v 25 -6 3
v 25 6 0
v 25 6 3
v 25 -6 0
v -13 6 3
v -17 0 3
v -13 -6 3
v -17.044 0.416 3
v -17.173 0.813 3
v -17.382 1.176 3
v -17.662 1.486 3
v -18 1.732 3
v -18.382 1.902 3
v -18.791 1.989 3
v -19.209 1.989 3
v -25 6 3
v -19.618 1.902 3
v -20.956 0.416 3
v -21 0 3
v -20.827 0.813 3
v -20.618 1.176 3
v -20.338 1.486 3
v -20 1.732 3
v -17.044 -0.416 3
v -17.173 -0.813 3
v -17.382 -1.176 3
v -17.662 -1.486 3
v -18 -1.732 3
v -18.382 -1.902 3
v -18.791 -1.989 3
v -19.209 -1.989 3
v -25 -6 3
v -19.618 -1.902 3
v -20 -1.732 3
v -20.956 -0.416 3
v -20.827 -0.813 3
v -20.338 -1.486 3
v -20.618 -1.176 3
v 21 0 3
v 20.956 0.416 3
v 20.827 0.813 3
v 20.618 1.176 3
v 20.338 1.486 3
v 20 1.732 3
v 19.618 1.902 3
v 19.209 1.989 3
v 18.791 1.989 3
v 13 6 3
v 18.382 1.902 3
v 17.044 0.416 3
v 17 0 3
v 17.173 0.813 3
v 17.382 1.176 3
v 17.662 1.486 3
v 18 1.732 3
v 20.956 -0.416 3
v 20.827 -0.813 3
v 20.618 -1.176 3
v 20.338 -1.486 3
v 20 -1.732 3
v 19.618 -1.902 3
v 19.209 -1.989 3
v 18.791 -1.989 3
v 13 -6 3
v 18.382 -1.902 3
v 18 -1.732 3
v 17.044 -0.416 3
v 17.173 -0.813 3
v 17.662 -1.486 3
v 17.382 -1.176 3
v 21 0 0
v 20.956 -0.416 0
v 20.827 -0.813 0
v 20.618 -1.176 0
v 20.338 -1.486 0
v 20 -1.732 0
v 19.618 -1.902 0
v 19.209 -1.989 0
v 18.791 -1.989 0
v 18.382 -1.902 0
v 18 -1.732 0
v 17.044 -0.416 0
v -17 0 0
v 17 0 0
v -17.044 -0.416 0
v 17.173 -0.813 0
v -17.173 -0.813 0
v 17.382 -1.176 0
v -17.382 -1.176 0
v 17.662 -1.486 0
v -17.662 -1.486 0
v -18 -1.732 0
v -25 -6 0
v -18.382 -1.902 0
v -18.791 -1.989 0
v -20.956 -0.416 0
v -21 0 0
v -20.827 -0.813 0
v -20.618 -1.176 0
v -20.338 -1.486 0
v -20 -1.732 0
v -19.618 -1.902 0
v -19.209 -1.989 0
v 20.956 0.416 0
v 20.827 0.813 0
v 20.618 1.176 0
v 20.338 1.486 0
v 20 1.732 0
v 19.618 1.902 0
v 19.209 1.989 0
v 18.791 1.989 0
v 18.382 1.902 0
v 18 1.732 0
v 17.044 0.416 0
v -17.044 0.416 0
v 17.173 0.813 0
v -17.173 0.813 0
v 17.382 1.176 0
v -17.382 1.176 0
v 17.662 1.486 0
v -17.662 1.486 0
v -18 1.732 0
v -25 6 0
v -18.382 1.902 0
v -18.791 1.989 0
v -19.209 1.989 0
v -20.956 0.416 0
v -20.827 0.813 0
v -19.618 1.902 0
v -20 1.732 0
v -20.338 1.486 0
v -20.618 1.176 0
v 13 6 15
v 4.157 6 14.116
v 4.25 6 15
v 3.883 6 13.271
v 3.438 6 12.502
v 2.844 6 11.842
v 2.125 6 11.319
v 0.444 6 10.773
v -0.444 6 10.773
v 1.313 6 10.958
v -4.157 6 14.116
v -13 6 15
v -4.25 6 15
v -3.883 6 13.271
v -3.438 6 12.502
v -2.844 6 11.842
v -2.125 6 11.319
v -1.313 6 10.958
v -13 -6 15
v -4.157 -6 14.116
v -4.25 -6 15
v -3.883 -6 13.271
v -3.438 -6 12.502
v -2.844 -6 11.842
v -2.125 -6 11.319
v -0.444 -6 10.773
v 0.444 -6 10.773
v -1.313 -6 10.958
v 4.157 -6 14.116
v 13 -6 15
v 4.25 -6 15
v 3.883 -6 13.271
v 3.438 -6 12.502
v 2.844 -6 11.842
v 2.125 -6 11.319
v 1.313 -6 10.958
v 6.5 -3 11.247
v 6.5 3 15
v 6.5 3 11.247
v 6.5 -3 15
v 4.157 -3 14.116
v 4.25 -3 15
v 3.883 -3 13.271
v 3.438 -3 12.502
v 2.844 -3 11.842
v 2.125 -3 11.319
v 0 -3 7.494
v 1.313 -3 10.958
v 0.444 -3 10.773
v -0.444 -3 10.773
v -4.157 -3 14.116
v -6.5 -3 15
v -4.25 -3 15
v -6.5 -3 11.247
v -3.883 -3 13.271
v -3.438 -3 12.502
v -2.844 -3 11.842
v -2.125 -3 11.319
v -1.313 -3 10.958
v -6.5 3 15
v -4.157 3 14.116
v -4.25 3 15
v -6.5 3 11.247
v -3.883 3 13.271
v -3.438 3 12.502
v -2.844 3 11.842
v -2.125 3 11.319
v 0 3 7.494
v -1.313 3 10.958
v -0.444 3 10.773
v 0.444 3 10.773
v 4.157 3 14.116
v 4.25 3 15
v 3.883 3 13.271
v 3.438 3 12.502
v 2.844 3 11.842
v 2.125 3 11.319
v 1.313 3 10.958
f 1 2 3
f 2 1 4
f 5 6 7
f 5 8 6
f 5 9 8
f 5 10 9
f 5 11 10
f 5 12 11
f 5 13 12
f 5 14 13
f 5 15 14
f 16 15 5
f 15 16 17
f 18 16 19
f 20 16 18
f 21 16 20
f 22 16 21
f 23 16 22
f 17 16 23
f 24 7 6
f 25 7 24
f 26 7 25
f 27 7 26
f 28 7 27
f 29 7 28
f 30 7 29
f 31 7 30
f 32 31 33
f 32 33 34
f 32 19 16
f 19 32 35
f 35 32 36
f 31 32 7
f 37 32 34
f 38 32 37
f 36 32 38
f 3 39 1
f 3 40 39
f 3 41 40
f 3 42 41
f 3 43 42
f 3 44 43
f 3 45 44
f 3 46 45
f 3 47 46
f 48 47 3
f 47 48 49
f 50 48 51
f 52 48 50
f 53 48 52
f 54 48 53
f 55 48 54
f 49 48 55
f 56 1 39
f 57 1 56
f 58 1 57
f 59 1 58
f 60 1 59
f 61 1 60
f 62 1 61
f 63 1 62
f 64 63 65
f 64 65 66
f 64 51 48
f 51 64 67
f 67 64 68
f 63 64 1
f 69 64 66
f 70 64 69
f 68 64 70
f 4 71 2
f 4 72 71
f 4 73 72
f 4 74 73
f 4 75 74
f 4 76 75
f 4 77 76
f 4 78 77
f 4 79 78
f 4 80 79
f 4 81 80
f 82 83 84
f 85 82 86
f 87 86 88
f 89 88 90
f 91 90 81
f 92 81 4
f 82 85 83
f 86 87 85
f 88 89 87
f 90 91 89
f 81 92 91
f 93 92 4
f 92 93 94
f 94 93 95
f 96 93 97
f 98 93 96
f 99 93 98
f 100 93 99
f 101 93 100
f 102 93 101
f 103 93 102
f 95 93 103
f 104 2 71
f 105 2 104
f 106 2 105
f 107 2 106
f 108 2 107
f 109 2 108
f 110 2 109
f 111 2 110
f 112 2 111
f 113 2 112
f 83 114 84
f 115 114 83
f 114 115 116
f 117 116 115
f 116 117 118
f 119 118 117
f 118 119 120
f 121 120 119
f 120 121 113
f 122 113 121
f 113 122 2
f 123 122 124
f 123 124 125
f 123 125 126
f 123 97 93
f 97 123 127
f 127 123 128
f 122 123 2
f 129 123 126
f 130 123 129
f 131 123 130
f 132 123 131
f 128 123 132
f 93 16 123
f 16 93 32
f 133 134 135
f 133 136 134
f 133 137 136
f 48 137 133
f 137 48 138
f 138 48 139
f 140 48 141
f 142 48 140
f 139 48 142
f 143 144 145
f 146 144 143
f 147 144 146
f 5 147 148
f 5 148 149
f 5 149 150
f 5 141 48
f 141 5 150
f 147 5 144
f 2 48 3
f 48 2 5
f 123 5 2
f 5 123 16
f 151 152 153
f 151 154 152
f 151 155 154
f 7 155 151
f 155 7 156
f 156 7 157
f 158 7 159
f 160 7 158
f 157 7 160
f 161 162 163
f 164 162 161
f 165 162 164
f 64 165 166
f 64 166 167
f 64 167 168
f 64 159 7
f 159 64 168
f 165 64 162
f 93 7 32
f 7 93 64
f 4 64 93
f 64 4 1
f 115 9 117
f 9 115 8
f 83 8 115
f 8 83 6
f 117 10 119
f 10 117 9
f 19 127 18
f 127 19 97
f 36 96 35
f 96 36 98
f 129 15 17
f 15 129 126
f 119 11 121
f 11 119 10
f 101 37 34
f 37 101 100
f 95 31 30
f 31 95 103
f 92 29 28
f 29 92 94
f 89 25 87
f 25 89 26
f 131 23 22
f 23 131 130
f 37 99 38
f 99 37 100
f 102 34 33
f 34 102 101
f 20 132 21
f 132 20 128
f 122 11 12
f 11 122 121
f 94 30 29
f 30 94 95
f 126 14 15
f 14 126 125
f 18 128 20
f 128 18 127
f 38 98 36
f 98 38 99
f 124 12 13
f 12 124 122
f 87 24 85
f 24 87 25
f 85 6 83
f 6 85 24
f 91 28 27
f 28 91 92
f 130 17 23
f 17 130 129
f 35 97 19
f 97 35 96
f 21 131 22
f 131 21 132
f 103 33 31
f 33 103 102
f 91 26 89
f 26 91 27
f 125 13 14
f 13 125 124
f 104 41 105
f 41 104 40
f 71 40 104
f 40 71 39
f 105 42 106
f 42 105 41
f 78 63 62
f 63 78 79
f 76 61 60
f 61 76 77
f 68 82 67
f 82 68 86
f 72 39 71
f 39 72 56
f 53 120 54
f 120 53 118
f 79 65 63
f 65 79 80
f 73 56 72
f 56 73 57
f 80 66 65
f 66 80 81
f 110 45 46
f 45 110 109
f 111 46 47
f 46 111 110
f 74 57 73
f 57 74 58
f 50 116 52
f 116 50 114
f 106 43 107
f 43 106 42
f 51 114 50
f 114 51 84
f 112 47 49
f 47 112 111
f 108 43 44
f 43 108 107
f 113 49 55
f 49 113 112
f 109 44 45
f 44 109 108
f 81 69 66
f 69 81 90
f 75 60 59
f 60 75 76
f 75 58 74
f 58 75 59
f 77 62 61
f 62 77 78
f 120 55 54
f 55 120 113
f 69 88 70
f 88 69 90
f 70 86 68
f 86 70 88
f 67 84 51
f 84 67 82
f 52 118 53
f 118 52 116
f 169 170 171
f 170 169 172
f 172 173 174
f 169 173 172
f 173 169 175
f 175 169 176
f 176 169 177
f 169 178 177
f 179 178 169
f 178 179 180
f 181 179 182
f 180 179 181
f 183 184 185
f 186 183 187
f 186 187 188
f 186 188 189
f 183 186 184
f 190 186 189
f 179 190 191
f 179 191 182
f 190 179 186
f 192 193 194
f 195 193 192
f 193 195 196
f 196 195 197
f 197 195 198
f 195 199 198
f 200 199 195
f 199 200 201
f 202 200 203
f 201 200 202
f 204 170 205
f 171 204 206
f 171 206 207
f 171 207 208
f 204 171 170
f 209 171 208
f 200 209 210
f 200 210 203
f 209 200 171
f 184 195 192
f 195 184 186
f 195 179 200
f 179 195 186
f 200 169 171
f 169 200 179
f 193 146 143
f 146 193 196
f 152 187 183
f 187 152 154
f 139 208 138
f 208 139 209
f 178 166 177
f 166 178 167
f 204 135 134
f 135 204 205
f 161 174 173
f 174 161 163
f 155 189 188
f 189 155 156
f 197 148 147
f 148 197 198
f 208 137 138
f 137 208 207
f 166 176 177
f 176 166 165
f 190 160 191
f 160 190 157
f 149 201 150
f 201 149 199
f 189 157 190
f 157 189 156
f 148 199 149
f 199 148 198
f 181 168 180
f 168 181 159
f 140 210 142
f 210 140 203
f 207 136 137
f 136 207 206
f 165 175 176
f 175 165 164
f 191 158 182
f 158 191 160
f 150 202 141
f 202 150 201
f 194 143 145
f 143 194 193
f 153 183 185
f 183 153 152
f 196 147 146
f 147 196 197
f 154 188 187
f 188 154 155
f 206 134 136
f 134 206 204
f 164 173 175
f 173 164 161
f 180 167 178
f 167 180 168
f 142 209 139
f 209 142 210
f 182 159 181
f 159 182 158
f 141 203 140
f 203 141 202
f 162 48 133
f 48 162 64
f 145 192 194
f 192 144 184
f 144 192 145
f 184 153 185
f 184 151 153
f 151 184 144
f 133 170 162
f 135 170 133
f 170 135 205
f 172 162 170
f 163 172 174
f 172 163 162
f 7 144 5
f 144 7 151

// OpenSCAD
// file: common.scad
/*--------------------------------------------------------------------------*
* Sizes and common routines for the CNC parts
*---------------------------------------------------------------------------*
* 13-Jul-2014 ShaneG
*
* First set of definitions using the components I have to experiment with.
*--------------------------------------------------------------------------*/

//---------------------------------------------------------------------------
// Common definitions
//---------------------------------------------------------------------------

RESOLUTION  = 0.1; // Resolution of your printer

PANEL_DEPTH = 3.0; // The prefered size of any shell material

BOLT_SIZE = 4.0; // Diameter of connecting bolts (M4)

BED_TO_MOUNT = 15.0;

GUIDE_ROD_DIAMETER = 12.00;

BEARING_DIAMETER = 22.00;
BEARING_HEIGHT   = 7.00;

//---------------------------------------------------------------------------
// Nuts
//---------------------------------------------------------------------------

/* Hex Nut
**
** Dimensios for a hex nut. The 'outer' diameter (ie: straight side to
** parallel straight side) of the nut does not seem very consistent -
** measurements indicate a 0.5mm range of error across nuts.
*/

NUT_OUTER_DIAMETER = 13.00;
NUT_INNER_DIAMETER = 8.50;  // Enough room for the bore and thread
NUT_HEIGHT         = 6;

/** Create a hexagon.
 *
 * The 'length' parameter specifies the distance from the center of the
 * hexagon to the center of one of the six straight edges. The 'depth'
 * parameter specifies the size in the Z axis. The resulting object
 * is centered on the origin.
 */
module hexagon(length, depth = 2) {
  width = 2 * length * tan(30);
  union() {
    cube(size = [ length * 2, width, depth ], center = true);
    rotate(a = [ 0, 0, 60 ]) {
      cube(size = [ length * 2, width, depth ], center = true);
      }
    rotate(a = [ 0, 0, -60 ]) {
      cube(size = [ length * 2, width, depth ], center = true);
      }
    }
  }

/** Create a hex nut object
 *
 * This function creates a hex nut (centered on the origin) that contains a
 * hole through the center.
 */
module hexnut(depth = NUT_HEIGHT) {
  difference() {
    hexagon(NUT_OUTER_DIAMETER / 2, depth);
    cylinder(h = 2 * depth, r = NUT_INNER_DIAMETER / 2, center = true, $fs = RESOLUTION);
    }
  }

/** Create a negative hex nut object
 *
 * This function creates a hex nut (centered on the origin) that can be subtracted
 * from another shape to allow a hole for the nut to fit into.
 */
module hexnut_negative(depth = NUT_HEIGHT, spindle = NUT_HEIGHT) {
  union() {
    hexagon(NUT_OUTER_DIAMETER / 2, depth);
    cylinder(h = max(2 * depth, spindle), r = NUT_INNER_DIAMETER / 2, center = true, $fs = RESOLUTION);
    }
  }
// main file
/*--------------------------------------------------------------------------*
* X dimension mount connectors
*---------------------------------------------------------------------------*
* 13-Jul-2014 ShaneG
*
* The connector in the X dimension
*--------------------------------------------------------------------------*/
include <common.scad>;

//--- Common definitions
STEM_WIDTH  = NUT_OUTER_DIAMETER * 2; // Width (in X) of the stem
STEM_HEIGHT = NUT_HEIGHT * 2;         // Height (in Y) of the stem


//---------------------------------------------------------------------------
// Helper modules
//---------------------------------------------------------------------------

/** Create the base
 *
 * The base needs to provide enough space for two connecting bolts and a
 * stem. The resulting object is centered around the Z axis and vertical
 * based at Z = 0.
 */
module baseplate() {
  plate_width = STEM_WIDTH + (6 * BOLT_SIZE);
  plate_height = max(STEM_HEIGHT, 3 * BOLT_SIZE);
  difference() {
    // Create the base plate
    translate(v = [ 0, 0, PANEL_DEPTH / 2 ]) {
      cube(size = [ plate_width, plate_height, PANEL_DEPTH ], center = true);
      }
    // Cut holes for the bolts
    translate(v = [ -((plate_width / 2) - (1.5 * BOLT_SIZE)), 0, 0 ]) {
      cylinder(h = PANEL_DEPTH * 4, r = BOLT_SIZE / 2, center = true, $fs = RESOLUTION);
      }
    translate(v = [ (plate_width / 2) - (1.5 * BOLT_SIZE), 0, 0 ]) {
      cylinder(h = PANEL_DEPTH * 4, r = BOLT_SIZE / 2, center = true, $fs = RESOLUTION);
      }
    }
  }

/** Create the stem
 *
 * The stem is centered around the Z axis and vertically based at Z = 0. The
 * height of the stem is such that the center of the nut is BED_TO_MOUNT mm
 * from Z = 0.
 */
module stem() {
  difference() {
    translate(v = [ -STEM_WIDTH / 2, -STEM_HEIGHT / 2, 0 ]) {
      cube(size = [ STEM_WIDTH, STEM_HEIGHT, BED_TO_MOUNT ], center = false);
      }
    translate(v = [ 0, 0, BED_TO_MOUNT ]) {
      rotate(a = [ 90, 0, 0 ]) {
        hexnut_negative(spindle = STEM_HEIGHT * 4);
        }
      }
    }
  }

//---------------------------------------------------------------------------
// Main shape
//---------------------------------------------------------------------------

union() {
  baseplate();
  stem();
  }
